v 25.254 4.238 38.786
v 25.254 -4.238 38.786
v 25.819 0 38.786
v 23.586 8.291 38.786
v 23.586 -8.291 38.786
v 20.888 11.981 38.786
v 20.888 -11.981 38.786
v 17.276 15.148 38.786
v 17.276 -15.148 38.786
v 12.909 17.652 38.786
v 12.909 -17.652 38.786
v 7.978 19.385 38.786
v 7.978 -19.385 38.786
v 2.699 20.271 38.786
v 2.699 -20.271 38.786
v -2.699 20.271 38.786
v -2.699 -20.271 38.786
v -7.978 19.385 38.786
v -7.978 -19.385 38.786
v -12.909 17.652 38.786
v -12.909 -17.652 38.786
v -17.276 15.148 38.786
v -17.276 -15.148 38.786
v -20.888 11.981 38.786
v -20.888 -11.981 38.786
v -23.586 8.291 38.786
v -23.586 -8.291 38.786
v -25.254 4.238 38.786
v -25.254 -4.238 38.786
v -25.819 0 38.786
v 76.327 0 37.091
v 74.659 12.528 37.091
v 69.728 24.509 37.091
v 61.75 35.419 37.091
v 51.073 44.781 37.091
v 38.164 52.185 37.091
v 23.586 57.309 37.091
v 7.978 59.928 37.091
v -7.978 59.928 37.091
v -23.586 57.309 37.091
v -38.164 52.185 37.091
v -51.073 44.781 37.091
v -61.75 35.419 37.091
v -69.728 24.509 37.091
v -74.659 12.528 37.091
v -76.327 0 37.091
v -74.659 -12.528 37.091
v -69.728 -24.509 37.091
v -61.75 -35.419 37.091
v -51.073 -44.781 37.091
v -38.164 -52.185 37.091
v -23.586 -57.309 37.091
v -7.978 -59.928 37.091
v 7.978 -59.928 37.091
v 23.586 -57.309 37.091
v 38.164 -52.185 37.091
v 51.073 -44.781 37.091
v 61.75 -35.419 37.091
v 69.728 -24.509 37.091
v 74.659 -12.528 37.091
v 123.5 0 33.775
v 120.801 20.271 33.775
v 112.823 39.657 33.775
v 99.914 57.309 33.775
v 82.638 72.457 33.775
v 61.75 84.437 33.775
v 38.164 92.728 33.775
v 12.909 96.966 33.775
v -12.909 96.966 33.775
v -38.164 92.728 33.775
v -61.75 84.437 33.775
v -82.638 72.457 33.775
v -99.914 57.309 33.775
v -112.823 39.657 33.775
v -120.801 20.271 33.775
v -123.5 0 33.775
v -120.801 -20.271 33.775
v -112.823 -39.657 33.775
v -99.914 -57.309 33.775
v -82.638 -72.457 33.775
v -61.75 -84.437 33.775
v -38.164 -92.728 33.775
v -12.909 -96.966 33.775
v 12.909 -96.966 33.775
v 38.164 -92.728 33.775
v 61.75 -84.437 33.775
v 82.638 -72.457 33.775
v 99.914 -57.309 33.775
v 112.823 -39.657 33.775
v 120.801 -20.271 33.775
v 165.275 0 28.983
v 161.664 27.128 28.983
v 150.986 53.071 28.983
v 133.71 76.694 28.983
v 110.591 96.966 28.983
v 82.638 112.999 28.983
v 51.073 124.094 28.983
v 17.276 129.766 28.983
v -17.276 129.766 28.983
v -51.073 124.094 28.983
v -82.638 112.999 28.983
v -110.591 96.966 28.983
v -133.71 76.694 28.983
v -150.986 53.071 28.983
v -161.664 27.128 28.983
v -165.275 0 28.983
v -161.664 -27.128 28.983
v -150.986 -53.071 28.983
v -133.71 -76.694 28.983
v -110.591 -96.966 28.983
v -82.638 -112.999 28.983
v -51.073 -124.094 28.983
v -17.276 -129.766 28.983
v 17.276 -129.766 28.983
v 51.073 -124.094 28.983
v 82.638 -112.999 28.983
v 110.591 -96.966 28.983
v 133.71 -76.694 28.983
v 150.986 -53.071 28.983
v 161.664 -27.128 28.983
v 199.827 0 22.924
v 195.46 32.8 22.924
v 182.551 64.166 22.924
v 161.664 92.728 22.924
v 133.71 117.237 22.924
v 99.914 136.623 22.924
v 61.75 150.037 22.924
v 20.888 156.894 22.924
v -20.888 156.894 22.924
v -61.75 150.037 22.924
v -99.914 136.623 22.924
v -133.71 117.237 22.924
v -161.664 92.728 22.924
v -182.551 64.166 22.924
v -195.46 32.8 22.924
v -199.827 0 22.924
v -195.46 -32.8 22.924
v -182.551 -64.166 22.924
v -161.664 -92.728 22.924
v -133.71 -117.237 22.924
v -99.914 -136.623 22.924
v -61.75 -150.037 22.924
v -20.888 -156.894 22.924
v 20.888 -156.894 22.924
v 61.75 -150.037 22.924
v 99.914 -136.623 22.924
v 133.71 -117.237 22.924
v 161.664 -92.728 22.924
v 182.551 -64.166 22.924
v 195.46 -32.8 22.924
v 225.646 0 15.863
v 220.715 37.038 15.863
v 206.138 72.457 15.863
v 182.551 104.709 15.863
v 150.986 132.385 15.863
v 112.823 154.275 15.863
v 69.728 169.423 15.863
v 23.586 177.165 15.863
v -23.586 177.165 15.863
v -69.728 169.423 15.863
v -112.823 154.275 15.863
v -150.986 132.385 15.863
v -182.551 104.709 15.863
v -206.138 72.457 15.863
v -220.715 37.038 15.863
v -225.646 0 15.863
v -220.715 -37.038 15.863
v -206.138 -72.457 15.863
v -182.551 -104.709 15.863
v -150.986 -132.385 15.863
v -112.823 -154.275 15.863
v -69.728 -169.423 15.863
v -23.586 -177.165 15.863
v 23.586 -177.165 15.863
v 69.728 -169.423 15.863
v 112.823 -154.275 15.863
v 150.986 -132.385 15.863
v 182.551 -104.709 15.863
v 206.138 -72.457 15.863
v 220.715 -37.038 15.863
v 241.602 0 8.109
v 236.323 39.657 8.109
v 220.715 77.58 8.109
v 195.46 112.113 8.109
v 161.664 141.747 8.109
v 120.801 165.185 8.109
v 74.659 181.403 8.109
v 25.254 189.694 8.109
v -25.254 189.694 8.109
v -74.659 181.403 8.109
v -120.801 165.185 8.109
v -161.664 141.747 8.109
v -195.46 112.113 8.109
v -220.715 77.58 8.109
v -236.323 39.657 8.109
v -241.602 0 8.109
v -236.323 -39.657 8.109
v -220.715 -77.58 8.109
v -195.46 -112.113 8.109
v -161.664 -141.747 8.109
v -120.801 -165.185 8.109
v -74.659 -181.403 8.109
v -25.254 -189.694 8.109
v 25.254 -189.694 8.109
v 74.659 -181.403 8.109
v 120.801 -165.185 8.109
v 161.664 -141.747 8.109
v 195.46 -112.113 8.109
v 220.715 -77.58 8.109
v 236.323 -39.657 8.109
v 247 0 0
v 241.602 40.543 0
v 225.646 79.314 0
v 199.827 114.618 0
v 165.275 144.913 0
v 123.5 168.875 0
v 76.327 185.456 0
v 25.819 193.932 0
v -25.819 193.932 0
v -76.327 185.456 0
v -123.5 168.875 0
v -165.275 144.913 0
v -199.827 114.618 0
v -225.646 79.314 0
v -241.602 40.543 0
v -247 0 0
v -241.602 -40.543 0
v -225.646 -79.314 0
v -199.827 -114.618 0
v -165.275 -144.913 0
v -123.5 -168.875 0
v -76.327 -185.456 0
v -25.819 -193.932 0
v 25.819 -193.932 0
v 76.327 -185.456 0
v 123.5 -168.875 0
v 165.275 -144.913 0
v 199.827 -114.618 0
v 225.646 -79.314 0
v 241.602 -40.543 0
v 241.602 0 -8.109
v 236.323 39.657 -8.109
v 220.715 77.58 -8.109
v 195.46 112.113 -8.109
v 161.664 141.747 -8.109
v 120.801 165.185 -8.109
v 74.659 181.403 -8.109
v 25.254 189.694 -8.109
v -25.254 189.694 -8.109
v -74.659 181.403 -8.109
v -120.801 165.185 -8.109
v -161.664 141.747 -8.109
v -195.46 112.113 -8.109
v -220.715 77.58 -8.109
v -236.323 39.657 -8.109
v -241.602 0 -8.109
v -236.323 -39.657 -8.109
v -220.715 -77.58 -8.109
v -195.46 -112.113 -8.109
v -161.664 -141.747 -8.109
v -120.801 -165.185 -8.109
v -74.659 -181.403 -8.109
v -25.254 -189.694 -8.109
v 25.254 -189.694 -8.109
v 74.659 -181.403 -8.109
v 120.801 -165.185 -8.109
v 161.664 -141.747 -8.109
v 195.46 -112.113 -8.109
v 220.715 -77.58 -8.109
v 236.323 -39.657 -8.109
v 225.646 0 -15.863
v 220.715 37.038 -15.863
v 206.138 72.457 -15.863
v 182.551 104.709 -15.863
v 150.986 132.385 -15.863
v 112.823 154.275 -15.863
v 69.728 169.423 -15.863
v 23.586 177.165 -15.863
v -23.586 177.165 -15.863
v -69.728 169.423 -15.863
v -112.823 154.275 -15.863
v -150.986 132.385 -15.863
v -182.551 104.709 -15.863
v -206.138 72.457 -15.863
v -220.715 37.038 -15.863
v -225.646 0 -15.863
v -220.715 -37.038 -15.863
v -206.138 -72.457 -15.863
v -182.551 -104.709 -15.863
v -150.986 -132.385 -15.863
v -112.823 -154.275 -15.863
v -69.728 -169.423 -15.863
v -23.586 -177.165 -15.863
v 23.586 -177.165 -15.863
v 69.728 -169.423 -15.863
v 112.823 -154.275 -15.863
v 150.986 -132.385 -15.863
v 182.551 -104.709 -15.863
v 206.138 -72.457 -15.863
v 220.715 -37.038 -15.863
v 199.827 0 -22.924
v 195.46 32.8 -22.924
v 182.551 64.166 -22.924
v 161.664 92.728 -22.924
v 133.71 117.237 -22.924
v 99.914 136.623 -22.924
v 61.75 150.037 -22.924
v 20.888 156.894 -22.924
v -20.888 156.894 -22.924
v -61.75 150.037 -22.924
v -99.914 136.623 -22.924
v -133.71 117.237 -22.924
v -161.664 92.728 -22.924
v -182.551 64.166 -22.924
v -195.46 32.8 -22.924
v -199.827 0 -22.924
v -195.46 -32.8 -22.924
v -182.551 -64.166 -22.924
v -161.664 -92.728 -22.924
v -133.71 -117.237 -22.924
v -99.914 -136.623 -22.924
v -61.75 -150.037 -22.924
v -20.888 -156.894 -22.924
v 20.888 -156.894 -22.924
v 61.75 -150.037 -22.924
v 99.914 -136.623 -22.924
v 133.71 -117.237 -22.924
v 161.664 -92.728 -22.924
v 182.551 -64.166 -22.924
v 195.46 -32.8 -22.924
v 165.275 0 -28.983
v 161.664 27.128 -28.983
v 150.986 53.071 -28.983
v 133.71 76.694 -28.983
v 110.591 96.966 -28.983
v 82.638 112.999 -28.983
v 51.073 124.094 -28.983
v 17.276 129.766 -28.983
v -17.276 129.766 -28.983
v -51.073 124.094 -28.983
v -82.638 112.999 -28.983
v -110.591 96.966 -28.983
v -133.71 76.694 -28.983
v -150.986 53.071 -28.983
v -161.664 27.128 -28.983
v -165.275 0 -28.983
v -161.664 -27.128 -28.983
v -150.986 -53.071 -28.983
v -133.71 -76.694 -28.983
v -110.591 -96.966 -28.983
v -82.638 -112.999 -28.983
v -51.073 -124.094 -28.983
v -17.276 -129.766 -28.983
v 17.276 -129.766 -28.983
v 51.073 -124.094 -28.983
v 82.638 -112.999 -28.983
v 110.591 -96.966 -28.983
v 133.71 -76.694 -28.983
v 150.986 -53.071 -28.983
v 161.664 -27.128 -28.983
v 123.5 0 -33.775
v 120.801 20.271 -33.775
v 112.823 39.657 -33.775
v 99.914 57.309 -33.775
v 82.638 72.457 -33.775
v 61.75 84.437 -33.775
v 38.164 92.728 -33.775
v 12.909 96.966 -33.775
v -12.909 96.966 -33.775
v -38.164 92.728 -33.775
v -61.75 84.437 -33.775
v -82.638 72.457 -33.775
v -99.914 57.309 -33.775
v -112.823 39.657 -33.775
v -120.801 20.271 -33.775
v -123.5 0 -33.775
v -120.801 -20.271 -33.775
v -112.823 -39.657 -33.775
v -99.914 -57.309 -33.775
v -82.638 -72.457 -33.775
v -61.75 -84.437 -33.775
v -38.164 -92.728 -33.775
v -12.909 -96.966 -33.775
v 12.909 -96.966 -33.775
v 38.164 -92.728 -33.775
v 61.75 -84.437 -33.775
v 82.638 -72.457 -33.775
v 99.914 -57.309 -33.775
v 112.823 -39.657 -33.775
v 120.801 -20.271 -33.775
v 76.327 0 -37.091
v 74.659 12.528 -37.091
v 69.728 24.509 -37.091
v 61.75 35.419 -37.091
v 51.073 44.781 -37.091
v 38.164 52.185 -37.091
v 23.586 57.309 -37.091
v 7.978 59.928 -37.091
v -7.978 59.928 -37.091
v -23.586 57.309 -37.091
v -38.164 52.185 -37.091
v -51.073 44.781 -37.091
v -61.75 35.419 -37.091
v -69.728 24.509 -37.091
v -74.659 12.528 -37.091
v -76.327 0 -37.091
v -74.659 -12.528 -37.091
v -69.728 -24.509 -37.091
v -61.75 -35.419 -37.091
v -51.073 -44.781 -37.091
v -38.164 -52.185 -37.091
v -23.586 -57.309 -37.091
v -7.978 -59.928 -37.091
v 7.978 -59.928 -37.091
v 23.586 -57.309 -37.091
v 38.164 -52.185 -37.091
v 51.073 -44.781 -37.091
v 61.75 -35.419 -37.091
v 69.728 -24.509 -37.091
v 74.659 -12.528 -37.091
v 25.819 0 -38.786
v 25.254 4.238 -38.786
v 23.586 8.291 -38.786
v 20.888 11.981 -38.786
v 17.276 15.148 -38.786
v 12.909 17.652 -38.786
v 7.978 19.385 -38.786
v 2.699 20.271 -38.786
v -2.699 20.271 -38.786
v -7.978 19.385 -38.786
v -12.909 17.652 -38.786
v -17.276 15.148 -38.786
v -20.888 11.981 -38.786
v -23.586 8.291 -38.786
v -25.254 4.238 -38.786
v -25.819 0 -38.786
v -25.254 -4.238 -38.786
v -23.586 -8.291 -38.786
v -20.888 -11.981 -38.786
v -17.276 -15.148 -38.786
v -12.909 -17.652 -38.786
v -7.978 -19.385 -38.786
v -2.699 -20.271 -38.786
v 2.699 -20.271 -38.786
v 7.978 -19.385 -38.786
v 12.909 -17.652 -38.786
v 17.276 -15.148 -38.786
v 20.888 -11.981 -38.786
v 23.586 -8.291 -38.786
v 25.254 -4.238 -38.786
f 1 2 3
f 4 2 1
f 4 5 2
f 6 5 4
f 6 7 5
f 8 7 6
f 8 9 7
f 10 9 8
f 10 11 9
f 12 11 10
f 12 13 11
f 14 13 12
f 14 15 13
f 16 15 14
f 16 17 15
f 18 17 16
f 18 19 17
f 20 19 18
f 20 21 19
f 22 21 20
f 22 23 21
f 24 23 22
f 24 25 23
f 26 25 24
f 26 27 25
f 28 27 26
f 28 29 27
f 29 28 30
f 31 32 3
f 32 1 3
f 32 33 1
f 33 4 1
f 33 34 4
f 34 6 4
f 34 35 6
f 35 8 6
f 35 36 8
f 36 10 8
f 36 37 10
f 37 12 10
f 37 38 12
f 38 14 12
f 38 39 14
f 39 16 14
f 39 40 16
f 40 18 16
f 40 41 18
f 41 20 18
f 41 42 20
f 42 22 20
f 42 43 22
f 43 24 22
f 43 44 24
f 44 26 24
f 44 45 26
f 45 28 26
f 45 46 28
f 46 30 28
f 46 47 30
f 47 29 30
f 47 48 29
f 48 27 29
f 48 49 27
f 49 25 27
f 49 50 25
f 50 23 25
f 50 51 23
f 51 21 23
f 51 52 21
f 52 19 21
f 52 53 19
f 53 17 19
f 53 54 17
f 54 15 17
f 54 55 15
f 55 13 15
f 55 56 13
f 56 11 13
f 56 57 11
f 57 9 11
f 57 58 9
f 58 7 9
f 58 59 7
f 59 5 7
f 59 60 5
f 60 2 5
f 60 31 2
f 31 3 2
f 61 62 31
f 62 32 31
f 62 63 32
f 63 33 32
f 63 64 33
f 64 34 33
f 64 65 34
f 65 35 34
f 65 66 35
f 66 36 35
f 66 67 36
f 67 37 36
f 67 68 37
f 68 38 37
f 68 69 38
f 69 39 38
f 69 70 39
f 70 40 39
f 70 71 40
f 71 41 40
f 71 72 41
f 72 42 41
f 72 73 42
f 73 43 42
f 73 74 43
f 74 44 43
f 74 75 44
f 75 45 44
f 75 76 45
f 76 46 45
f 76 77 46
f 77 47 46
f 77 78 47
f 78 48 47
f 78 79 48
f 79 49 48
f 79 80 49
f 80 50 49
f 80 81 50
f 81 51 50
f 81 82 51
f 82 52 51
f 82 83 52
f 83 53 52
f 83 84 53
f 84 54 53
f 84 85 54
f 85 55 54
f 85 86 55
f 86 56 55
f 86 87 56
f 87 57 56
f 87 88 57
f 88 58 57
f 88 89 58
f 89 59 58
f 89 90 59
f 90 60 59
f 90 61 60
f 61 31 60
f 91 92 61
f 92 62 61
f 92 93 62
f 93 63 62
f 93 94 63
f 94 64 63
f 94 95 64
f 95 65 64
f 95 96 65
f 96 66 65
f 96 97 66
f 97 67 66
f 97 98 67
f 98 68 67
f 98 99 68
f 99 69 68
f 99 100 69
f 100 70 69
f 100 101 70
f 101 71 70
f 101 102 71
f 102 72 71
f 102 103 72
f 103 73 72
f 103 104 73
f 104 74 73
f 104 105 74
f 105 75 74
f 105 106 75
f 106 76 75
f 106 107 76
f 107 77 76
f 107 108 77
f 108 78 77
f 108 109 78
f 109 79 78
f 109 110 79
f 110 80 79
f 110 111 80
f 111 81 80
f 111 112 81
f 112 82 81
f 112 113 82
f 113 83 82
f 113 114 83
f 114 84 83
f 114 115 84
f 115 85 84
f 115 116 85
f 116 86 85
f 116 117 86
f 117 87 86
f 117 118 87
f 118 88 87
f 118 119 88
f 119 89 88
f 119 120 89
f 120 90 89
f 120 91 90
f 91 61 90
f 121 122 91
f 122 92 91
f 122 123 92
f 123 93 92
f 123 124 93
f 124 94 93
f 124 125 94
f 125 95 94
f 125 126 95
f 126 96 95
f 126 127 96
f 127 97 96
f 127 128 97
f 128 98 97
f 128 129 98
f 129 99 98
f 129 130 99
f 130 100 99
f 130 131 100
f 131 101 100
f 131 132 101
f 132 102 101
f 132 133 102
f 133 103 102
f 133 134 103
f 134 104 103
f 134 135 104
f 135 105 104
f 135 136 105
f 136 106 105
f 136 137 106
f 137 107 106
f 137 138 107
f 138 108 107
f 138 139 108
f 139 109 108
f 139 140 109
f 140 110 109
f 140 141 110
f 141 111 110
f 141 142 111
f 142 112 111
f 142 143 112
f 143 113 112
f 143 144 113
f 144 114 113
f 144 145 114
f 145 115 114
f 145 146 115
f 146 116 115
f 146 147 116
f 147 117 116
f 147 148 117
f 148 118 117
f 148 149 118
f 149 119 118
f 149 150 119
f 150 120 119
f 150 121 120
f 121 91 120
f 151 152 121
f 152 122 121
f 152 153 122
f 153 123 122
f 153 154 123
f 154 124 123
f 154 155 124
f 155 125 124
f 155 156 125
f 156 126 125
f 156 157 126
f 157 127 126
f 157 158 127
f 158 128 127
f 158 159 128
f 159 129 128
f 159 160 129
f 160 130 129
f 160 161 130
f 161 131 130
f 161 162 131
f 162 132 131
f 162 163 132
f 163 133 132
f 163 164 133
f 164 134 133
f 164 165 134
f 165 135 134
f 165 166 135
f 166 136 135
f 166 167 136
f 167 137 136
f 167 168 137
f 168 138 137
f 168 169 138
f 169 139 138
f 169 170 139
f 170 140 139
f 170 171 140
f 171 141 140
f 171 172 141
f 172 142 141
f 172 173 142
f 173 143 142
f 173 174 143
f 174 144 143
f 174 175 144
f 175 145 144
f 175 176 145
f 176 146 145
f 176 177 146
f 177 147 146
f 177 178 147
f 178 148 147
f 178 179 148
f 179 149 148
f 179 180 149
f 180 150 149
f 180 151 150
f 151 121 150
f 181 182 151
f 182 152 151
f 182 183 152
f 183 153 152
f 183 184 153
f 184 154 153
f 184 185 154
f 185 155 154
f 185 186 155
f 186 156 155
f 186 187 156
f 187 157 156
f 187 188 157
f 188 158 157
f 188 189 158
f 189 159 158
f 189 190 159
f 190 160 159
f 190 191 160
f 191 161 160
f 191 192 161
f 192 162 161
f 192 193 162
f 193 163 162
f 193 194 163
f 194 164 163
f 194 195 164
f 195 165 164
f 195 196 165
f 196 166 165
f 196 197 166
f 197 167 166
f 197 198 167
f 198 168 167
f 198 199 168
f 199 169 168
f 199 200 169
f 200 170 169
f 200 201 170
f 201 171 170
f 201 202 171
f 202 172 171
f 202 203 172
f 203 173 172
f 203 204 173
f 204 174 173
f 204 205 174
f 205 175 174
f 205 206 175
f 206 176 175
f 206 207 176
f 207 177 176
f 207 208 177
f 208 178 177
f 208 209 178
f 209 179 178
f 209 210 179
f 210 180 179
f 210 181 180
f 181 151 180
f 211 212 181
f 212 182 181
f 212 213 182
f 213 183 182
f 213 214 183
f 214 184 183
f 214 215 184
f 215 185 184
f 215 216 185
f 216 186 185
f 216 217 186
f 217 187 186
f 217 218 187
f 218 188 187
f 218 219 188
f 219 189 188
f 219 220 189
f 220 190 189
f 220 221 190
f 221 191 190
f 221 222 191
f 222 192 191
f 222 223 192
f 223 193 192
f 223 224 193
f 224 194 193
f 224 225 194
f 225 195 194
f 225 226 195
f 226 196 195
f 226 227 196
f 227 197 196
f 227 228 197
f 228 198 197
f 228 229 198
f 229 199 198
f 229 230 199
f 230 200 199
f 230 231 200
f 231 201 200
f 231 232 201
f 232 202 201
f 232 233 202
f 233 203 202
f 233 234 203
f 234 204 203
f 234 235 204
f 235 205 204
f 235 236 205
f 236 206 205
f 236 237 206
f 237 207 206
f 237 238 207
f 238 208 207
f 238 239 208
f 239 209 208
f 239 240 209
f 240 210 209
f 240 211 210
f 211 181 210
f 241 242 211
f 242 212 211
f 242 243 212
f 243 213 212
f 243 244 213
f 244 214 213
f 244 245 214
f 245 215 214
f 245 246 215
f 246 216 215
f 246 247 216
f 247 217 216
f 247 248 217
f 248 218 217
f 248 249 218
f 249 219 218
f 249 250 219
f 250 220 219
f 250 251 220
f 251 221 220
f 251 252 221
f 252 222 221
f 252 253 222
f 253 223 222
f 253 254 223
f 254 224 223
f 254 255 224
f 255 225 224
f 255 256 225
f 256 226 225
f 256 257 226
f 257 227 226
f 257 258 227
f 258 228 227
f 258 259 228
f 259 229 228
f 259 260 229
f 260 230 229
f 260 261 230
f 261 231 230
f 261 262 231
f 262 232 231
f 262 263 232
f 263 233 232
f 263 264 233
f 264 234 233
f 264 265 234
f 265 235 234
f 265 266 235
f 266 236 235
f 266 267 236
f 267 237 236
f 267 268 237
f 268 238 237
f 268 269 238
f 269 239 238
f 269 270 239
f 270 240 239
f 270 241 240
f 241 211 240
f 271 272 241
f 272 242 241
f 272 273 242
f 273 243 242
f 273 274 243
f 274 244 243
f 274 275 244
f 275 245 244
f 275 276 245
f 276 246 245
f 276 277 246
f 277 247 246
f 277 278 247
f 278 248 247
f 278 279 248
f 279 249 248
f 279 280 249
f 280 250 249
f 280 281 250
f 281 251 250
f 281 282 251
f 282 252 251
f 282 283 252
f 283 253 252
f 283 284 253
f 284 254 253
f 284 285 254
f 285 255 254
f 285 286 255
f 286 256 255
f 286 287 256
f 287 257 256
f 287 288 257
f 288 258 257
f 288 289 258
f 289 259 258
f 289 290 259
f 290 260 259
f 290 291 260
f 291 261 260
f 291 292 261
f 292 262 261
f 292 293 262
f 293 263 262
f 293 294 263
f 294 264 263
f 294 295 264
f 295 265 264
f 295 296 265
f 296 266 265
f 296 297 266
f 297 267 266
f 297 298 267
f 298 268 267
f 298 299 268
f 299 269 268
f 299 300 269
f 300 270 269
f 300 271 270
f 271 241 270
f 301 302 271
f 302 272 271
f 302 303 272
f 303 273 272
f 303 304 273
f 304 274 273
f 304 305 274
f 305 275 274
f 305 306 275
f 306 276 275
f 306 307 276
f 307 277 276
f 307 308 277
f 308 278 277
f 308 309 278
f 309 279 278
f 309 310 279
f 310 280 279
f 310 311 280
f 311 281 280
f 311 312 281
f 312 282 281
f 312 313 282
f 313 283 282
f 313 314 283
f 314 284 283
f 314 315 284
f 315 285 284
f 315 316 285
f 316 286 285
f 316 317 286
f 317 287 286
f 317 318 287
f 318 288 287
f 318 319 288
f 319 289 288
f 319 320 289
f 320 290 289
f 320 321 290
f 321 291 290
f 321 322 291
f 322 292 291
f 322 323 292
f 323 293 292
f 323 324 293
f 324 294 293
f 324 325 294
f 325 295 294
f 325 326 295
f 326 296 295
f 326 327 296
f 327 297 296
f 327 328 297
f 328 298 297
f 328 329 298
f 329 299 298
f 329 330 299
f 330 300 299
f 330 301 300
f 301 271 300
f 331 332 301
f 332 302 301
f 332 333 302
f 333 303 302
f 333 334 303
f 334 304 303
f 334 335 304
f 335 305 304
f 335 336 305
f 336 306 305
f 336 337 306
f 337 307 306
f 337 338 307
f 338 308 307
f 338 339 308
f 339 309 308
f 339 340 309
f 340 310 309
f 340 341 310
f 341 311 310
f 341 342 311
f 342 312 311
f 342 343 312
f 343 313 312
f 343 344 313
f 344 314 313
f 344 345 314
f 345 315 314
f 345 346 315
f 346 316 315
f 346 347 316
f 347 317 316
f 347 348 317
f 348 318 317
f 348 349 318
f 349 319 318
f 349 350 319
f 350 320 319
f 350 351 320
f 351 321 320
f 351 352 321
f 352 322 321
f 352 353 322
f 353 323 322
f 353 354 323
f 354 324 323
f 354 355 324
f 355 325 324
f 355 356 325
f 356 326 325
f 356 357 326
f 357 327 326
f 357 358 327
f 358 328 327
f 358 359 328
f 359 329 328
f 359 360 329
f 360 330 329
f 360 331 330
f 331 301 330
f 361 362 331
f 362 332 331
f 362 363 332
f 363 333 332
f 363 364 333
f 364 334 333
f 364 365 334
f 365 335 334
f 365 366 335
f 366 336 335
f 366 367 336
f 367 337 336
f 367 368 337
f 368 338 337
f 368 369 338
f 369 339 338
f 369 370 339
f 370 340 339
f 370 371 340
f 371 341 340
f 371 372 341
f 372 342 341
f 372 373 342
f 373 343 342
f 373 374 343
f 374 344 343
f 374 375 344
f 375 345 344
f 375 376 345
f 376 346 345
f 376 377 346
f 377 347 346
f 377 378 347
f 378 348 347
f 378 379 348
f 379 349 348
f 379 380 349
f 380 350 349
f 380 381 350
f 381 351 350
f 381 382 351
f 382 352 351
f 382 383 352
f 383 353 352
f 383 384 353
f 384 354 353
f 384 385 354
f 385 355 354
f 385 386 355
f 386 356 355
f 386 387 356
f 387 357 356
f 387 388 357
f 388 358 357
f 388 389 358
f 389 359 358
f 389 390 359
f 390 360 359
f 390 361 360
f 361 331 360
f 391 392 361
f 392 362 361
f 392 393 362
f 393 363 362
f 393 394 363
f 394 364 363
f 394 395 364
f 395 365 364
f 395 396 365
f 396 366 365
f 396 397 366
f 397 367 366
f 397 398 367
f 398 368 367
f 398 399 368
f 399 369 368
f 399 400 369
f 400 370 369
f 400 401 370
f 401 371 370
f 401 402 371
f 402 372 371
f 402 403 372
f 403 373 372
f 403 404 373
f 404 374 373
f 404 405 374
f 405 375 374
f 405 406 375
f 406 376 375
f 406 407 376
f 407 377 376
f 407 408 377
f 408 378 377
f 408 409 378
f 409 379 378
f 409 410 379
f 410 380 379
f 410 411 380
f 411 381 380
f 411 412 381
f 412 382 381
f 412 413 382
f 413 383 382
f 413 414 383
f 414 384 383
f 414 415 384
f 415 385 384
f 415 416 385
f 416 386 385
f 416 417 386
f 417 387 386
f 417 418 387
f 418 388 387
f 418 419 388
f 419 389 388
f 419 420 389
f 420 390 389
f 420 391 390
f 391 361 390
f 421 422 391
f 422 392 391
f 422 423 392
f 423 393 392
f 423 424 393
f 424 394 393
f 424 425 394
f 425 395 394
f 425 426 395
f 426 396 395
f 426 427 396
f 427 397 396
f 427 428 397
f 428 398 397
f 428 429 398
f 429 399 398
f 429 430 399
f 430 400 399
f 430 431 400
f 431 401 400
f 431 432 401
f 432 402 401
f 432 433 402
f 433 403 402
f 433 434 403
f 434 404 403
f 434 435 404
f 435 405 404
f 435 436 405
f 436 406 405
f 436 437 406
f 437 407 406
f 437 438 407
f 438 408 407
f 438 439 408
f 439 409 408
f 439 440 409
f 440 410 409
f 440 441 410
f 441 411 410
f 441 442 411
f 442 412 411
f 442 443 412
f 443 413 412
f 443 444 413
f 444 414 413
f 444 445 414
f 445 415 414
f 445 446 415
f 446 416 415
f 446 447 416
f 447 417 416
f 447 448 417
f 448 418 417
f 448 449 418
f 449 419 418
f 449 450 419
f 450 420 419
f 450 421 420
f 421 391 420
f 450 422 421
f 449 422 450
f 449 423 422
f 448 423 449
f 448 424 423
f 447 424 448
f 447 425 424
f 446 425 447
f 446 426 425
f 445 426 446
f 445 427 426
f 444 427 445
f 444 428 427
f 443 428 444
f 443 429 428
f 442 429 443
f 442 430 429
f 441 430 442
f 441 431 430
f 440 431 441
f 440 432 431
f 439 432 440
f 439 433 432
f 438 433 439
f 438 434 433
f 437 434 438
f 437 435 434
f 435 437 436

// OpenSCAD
// Generated by SolidPython 1.0.1 on 2020-07-29 00:46:54


scale(v = [19, 15, 3]) {
	sphere(r = 13);
}
/***********************************************
*********      SolidPython code:      **********
************************************************
 
# import packages: SolidPython
from solid import *
from solid.utils import *
from itertools import chain, combinations, permutations


class Resize:

    def __init__(self, scad_file):
        self.scad_file = scad_file
        #self.scad_file = import_scad(scad_file)
        # cone/cylinder param:
        self.r1 = 0
        self.r2 = 0
        self.h = 0
        # rectangular prism param:
        self.w = 0
        self.l = 0
        # ellipse param:
        self.r = 0

    # import OpenScad code (file name corresponds to shape)


    # classify shape + parameters
    def assign(self, param1, param2, param3):
        if self.scad_file == 'cone.scad':
            self.r1 = param1
            self.r2 = param2
            self.h = param3
        elif self.scad_file == 'cylinder.scad':
            self.r1 = param1
            self.r2 = param2
            self.h = param3
        elif self.scad_file == 'rectangularPrism.scad':
            self.h = param1
            self.l = param2
            self.w = param3
        else:
            self.r = param1
            self.h = param2

    # resize parameters
    def iterate(self):
        x = range(3, 20, 2)
        i = 1
        if self.scad_file == 'cone.scad':
            tempList = list(permutations(x, 2))
            for temp in tempList:
                param1 = temp[0]
                param2 = temp[1]
                filepath = 'produced_scad_files/' + 'cone' + str(param1) + '_' + str(param2) + '_' + '.scad'
                scad_render_to_file(cylinder(h=param1, r1=param2, r2=0), filepath)

        elif self.scad_file == 'cylinder.scad':
            tempList = list(permutations(x, 3))
            for temp in tempList:
                param1 = temp[0]
                param2 = temp[1]
                filepath = 'produced_scad_files/' + 'cylinder' + str(param1) + '_' + str(param2) + '_' + '.scad'
                scad_render_to_file(cylinder(h=param1, r1=param2, r2=param2), filepath)

        elif self.scad_file == 'rectangularPrism.scad':
            tempList = list(permutations(x, 3))
            for temp in tempList:
                param1 = temp[0]
                param2 = temp[1]
                param3 = temp[2]
                filepath = 'produced_scad_files/' + 'rectangularPrism' + str(param1) + '_' + str(param2) + '_' + str(
                    param3) + '.scad'
                scad_render_to_file(cube(size=(param1, param2, param3)), filepath)

        elif self.scad_file == 'ellipse.scad':
            tempList = list(permutations(x, 4))
            for temp in tempList:
                param1 = temp[0]
                param2 = temp[1]
                param3 = temp[2]
                param4 = temp[3]
                filepath = 'produced_scad_files/' + 'ellipse' + str(param1) + '_' + str(param2) + '_' + str(param3) + '_' + str(param4) + '.scad'
                scad_render_to_file(scale([param1, param2, param3])(sphere(r=param4)), filepath)

    def render_to_scadfile(self):
        scad_render_to_file(scad, 'example.scad') 
 
************************************************/
